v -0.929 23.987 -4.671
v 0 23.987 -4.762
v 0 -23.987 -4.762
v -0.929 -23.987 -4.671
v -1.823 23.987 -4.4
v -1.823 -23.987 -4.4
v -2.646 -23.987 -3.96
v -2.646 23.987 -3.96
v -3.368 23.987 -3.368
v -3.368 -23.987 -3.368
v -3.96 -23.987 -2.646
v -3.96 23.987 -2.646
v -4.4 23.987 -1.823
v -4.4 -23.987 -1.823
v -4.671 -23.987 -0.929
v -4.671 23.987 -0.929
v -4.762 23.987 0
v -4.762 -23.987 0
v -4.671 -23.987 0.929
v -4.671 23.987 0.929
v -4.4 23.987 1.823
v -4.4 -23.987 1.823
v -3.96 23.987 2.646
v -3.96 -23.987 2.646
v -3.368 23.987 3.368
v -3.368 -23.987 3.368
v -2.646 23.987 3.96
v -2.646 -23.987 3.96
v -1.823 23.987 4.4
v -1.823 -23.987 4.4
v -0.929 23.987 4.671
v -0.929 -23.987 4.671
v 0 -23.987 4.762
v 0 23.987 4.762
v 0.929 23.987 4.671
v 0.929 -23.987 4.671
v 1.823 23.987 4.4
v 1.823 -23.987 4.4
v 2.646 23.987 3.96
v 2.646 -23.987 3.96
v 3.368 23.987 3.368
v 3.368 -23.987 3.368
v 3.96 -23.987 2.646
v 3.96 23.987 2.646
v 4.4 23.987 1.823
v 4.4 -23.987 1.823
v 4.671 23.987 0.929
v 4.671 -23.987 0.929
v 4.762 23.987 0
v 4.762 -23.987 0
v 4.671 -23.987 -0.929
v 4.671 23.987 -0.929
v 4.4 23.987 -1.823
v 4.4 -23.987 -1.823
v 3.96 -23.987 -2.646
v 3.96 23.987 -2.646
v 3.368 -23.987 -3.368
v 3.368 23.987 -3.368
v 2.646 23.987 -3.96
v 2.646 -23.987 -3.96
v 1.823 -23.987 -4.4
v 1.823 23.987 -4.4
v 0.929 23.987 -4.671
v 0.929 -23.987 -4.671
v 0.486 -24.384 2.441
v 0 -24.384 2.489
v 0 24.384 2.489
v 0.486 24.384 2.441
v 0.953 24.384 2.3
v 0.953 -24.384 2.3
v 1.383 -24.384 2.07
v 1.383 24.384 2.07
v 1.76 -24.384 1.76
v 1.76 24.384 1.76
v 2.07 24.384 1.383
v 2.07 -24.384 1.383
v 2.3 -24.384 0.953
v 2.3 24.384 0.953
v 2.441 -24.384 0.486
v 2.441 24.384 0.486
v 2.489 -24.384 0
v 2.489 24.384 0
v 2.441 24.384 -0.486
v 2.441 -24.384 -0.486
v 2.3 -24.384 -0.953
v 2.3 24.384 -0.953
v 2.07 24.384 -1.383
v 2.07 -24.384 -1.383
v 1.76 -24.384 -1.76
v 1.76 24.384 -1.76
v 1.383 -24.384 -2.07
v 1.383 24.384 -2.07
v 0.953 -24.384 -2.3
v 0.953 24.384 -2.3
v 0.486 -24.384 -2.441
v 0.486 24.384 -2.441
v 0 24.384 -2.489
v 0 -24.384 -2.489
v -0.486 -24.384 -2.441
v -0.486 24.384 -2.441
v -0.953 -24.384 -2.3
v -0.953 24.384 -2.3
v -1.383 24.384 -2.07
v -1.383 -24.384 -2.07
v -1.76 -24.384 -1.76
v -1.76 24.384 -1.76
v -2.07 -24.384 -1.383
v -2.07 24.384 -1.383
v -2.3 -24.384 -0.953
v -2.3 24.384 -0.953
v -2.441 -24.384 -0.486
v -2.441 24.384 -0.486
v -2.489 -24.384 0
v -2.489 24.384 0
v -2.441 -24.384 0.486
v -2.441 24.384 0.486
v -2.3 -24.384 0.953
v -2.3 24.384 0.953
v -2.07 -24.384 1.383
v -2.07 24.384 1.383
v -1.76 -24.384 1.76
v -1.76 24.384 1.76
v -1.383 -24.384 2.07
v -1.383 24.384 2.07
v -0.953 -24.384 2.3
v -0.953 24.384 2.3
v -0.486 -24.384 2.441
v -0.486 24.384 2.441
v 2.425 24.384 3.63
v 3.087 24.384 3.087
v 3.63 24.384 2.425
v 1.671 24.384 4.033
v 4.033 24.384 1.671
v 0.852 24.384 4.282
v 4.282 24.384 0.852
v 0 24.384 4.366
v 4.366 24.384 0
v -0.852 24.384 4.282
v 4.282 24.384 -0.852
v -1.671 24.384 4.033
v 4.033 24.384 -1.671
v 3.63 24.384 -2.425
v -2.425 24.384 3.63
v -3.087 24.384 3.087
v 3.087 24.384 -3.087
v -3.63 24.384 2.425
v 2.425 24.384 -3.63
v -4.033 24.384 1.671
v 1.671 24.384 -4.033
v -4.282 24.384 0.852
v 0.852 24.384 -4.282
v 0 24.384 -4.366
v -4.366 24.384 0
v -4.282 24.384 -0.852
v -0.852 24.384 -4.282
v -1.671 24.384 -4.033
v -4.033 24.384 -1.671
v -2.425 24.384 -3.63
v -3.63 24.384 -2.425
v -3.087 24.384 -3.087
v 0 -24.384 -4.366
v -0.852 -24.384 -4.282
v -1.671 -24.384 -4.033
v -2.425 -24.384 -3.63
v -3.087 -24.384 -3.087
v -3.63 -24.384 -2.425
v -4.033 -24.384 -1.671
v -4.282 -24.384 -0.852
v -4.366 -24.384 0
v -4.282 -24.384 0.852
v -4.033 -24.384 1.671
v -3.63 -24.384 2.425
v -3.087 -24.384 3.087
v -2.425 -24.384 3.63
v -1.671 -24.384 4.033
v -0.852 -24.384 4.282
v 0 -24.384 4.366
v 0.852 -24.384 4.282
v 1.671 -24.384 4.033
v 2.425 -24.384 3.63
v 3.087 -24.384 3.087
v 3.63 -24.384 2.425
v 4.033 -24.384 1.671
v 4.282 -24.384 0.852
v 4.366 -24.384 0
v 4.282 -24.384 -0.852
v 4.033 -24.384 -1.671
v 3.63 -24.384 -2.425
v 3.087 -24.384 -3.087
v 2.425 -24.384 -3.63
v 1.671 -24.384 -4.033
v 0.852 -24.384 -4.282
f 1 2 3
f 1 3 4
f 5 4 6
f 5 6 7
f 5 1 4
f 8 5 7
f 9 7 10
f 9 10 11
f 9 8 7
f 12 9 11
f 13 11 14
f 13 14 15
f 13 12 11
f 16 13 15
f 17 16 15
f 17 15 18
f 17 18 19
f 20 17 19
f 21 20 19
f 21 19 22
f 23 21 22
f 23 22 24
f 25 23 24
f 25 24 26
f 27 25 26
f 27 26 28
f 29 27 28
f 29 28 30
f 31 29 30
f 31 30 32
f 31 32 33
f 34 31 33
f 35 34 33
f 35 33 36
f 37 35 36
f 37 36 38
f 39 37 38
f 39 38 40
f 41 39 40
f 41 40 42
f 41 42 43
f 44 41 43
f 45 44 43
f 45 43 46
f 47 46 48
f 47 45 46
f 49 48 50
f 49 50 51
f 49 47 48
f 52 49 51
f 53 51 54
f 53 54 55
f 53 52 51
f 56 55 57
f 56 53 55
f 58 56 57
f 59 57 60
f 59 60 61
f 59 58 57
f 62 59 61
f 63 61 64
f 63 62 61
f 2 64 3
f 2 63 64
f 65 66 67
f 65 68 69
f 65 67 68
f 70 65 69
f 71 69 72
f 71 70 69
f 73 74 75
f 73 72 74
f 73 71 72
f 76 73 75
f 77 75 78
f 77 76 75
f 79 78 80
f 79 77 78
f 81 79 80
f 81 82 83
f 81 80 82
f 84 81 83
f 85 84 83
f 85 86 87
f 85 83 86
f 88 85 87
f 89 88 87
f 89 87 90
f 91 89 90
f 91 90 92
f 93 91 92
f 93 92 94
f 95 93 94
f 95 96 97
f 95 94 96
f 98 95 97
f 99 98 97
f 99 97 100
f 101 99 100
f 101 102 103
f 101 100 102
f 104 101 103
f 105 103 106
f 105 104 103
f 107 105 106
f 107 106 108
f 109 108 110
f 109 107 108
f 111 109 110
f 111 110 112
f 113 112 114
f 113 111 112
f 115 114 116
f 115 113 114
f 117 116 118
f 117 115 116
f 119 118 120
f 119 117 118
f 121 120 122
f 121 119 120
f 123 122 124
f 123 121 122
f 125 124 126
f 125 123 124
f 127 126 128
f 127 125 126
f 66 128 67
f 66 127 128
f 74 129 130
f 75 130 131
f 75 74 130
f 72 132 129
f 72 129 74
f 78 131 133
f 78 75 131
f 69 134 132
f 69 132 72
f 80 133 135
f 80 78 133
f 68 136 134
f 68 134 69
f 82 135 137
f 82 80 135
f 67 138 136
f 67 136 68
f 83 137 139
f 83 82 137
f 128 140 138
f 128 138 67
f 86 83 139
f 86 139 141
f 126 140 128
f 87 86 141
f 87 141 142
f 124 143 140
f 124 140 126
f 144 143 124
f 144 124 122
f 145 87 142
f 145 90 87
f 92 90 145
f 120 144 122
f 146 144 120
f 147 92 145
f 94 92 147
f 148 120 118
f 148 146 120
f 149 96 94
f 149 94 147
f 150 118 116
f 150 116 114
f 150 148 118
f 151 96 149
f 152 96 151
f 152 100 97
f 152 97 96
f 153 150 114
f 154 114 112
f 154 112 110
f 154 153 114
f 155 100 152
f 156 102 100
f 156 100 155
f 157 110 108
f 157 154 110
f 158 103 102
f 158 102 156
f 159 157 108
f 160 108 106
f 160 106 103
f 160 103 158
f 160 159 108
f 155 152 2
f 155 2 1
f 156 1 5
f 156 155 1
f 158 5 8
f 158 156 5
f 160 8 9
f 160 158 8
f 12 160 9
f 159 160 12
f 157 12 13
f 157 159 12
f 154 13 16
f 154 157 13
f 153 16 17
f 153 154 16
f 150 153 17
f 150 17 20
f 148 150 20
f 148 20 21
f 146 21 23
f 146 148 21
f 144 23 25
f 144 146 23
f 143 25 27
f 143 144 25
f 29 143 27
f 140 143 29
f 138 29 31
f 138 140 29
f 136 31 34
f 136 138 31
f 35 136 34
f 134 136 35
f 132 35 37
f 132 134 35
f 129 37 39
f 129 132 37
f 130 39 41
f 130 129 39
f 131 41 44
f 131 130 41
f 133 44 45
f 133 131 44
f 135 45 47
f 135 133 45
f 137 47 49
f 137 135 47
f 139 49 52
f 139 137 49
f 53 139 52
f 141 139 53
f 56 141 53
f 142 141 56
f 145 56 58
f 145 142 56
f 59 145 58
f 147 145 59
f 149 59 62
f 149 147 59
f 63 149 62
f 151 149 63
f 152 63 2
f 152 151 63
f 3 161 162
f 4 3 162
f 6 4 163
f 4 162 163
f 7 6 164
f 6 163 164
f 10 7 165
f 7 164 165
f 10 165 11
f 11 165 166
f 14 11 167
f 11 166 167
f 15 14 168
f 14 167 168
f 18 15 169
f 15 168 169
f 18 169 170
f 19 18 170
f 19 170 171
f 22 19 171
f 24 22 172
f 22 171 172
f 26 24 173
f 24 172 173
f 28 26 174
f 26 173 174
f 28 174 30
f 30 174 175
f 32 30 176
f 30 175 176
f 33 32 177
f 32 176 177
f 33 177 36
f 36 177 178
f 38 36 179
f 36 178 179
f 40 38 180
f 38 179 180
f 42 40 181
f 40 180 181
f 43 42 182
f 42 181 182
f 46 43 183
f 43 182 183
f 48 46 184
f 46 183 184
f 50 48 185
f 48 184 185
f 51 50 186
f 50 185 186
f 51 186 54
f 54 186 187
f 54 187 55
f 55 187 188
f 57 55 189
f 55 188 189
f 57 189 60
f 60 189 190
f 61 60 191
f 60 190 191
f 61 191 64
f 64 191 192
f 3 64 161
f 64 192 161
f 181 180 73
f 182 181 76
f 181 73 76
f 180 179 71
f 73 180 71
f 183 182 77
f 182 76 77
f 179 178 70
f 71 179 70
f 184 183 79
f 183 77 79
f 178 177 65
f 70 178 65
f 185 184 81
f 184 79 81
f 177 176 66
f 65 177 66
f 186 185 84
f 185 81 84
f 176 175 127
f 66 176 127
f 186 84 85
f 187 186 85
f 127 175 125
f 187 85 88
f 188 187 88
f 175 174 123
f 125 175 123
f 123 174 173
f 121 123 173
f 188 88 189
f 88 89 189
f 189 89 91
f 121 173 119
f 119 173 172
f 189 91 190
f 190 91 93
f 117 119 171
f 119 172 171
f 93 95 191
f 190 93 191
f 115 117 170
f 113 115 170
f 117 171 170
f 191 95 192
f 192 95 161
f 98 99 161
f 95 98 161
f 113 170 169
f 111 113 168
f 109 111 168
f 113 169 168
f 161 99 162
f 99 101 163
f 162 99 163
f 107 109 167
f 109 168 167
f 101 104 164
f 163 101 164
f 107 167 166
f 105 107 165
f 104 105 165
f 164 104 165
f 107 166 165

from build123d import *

# Parameters (mm, degrees)
CROQUIS2_R                = 4.7625
SALIENTE_EXTRUIR1_DEPTH   = 24.384
CHAFL_N1_SIZE             = 0.396875
CLEARANCE_HOLE_DEPTH      = 26.297080237
CLEARANCE_HOLE_DEPTH_BACK = 26.297080237
CROQUIS4_R                = 2.4892


with BuildPart() as part:
    # Croquis2 → Saliente-Extruir1 (new, symmetric)
    with BuildSketch(Plane(origin=(0, 0, 0), x_dir=(1, 0, 0), z_dir=(0, 1, 0))):
        Circle(CROQUIS2_R)
    extrude(amount=SALIENTE_EXTRUIR1_DEPTH, both=True)

    # Chaflán1
    chafl_n1_edges = [part.edges().sort_by_distance(p)[0] for p in [
        (-4.7625, -24.384, 0),
        (-4.7625, 24.384, 0),
    ]]
    chamfer(chafl_n1_edges, length=CHAFL_N1_SIZE)

    # Croquis4 → Clearance Hole (cut, two sides: drawn at the far end of the back side and taken through both)
    with BuildSketch(Plane(origin=(0, 0, 0), x_dir=(1, 0, 0), z_dir=(0, 1, 0)).offset(-CLEARANCE_HOLE_DEPTH_BACK)):
        Circle(CROQUIS4_R)
    extrude(amount=CLEARANCE_HOLE_DEPTH + CLEARANCE_HOLE_DEPTH_BACK, mode=Mode.SUBTRACT)


solid = part.part
